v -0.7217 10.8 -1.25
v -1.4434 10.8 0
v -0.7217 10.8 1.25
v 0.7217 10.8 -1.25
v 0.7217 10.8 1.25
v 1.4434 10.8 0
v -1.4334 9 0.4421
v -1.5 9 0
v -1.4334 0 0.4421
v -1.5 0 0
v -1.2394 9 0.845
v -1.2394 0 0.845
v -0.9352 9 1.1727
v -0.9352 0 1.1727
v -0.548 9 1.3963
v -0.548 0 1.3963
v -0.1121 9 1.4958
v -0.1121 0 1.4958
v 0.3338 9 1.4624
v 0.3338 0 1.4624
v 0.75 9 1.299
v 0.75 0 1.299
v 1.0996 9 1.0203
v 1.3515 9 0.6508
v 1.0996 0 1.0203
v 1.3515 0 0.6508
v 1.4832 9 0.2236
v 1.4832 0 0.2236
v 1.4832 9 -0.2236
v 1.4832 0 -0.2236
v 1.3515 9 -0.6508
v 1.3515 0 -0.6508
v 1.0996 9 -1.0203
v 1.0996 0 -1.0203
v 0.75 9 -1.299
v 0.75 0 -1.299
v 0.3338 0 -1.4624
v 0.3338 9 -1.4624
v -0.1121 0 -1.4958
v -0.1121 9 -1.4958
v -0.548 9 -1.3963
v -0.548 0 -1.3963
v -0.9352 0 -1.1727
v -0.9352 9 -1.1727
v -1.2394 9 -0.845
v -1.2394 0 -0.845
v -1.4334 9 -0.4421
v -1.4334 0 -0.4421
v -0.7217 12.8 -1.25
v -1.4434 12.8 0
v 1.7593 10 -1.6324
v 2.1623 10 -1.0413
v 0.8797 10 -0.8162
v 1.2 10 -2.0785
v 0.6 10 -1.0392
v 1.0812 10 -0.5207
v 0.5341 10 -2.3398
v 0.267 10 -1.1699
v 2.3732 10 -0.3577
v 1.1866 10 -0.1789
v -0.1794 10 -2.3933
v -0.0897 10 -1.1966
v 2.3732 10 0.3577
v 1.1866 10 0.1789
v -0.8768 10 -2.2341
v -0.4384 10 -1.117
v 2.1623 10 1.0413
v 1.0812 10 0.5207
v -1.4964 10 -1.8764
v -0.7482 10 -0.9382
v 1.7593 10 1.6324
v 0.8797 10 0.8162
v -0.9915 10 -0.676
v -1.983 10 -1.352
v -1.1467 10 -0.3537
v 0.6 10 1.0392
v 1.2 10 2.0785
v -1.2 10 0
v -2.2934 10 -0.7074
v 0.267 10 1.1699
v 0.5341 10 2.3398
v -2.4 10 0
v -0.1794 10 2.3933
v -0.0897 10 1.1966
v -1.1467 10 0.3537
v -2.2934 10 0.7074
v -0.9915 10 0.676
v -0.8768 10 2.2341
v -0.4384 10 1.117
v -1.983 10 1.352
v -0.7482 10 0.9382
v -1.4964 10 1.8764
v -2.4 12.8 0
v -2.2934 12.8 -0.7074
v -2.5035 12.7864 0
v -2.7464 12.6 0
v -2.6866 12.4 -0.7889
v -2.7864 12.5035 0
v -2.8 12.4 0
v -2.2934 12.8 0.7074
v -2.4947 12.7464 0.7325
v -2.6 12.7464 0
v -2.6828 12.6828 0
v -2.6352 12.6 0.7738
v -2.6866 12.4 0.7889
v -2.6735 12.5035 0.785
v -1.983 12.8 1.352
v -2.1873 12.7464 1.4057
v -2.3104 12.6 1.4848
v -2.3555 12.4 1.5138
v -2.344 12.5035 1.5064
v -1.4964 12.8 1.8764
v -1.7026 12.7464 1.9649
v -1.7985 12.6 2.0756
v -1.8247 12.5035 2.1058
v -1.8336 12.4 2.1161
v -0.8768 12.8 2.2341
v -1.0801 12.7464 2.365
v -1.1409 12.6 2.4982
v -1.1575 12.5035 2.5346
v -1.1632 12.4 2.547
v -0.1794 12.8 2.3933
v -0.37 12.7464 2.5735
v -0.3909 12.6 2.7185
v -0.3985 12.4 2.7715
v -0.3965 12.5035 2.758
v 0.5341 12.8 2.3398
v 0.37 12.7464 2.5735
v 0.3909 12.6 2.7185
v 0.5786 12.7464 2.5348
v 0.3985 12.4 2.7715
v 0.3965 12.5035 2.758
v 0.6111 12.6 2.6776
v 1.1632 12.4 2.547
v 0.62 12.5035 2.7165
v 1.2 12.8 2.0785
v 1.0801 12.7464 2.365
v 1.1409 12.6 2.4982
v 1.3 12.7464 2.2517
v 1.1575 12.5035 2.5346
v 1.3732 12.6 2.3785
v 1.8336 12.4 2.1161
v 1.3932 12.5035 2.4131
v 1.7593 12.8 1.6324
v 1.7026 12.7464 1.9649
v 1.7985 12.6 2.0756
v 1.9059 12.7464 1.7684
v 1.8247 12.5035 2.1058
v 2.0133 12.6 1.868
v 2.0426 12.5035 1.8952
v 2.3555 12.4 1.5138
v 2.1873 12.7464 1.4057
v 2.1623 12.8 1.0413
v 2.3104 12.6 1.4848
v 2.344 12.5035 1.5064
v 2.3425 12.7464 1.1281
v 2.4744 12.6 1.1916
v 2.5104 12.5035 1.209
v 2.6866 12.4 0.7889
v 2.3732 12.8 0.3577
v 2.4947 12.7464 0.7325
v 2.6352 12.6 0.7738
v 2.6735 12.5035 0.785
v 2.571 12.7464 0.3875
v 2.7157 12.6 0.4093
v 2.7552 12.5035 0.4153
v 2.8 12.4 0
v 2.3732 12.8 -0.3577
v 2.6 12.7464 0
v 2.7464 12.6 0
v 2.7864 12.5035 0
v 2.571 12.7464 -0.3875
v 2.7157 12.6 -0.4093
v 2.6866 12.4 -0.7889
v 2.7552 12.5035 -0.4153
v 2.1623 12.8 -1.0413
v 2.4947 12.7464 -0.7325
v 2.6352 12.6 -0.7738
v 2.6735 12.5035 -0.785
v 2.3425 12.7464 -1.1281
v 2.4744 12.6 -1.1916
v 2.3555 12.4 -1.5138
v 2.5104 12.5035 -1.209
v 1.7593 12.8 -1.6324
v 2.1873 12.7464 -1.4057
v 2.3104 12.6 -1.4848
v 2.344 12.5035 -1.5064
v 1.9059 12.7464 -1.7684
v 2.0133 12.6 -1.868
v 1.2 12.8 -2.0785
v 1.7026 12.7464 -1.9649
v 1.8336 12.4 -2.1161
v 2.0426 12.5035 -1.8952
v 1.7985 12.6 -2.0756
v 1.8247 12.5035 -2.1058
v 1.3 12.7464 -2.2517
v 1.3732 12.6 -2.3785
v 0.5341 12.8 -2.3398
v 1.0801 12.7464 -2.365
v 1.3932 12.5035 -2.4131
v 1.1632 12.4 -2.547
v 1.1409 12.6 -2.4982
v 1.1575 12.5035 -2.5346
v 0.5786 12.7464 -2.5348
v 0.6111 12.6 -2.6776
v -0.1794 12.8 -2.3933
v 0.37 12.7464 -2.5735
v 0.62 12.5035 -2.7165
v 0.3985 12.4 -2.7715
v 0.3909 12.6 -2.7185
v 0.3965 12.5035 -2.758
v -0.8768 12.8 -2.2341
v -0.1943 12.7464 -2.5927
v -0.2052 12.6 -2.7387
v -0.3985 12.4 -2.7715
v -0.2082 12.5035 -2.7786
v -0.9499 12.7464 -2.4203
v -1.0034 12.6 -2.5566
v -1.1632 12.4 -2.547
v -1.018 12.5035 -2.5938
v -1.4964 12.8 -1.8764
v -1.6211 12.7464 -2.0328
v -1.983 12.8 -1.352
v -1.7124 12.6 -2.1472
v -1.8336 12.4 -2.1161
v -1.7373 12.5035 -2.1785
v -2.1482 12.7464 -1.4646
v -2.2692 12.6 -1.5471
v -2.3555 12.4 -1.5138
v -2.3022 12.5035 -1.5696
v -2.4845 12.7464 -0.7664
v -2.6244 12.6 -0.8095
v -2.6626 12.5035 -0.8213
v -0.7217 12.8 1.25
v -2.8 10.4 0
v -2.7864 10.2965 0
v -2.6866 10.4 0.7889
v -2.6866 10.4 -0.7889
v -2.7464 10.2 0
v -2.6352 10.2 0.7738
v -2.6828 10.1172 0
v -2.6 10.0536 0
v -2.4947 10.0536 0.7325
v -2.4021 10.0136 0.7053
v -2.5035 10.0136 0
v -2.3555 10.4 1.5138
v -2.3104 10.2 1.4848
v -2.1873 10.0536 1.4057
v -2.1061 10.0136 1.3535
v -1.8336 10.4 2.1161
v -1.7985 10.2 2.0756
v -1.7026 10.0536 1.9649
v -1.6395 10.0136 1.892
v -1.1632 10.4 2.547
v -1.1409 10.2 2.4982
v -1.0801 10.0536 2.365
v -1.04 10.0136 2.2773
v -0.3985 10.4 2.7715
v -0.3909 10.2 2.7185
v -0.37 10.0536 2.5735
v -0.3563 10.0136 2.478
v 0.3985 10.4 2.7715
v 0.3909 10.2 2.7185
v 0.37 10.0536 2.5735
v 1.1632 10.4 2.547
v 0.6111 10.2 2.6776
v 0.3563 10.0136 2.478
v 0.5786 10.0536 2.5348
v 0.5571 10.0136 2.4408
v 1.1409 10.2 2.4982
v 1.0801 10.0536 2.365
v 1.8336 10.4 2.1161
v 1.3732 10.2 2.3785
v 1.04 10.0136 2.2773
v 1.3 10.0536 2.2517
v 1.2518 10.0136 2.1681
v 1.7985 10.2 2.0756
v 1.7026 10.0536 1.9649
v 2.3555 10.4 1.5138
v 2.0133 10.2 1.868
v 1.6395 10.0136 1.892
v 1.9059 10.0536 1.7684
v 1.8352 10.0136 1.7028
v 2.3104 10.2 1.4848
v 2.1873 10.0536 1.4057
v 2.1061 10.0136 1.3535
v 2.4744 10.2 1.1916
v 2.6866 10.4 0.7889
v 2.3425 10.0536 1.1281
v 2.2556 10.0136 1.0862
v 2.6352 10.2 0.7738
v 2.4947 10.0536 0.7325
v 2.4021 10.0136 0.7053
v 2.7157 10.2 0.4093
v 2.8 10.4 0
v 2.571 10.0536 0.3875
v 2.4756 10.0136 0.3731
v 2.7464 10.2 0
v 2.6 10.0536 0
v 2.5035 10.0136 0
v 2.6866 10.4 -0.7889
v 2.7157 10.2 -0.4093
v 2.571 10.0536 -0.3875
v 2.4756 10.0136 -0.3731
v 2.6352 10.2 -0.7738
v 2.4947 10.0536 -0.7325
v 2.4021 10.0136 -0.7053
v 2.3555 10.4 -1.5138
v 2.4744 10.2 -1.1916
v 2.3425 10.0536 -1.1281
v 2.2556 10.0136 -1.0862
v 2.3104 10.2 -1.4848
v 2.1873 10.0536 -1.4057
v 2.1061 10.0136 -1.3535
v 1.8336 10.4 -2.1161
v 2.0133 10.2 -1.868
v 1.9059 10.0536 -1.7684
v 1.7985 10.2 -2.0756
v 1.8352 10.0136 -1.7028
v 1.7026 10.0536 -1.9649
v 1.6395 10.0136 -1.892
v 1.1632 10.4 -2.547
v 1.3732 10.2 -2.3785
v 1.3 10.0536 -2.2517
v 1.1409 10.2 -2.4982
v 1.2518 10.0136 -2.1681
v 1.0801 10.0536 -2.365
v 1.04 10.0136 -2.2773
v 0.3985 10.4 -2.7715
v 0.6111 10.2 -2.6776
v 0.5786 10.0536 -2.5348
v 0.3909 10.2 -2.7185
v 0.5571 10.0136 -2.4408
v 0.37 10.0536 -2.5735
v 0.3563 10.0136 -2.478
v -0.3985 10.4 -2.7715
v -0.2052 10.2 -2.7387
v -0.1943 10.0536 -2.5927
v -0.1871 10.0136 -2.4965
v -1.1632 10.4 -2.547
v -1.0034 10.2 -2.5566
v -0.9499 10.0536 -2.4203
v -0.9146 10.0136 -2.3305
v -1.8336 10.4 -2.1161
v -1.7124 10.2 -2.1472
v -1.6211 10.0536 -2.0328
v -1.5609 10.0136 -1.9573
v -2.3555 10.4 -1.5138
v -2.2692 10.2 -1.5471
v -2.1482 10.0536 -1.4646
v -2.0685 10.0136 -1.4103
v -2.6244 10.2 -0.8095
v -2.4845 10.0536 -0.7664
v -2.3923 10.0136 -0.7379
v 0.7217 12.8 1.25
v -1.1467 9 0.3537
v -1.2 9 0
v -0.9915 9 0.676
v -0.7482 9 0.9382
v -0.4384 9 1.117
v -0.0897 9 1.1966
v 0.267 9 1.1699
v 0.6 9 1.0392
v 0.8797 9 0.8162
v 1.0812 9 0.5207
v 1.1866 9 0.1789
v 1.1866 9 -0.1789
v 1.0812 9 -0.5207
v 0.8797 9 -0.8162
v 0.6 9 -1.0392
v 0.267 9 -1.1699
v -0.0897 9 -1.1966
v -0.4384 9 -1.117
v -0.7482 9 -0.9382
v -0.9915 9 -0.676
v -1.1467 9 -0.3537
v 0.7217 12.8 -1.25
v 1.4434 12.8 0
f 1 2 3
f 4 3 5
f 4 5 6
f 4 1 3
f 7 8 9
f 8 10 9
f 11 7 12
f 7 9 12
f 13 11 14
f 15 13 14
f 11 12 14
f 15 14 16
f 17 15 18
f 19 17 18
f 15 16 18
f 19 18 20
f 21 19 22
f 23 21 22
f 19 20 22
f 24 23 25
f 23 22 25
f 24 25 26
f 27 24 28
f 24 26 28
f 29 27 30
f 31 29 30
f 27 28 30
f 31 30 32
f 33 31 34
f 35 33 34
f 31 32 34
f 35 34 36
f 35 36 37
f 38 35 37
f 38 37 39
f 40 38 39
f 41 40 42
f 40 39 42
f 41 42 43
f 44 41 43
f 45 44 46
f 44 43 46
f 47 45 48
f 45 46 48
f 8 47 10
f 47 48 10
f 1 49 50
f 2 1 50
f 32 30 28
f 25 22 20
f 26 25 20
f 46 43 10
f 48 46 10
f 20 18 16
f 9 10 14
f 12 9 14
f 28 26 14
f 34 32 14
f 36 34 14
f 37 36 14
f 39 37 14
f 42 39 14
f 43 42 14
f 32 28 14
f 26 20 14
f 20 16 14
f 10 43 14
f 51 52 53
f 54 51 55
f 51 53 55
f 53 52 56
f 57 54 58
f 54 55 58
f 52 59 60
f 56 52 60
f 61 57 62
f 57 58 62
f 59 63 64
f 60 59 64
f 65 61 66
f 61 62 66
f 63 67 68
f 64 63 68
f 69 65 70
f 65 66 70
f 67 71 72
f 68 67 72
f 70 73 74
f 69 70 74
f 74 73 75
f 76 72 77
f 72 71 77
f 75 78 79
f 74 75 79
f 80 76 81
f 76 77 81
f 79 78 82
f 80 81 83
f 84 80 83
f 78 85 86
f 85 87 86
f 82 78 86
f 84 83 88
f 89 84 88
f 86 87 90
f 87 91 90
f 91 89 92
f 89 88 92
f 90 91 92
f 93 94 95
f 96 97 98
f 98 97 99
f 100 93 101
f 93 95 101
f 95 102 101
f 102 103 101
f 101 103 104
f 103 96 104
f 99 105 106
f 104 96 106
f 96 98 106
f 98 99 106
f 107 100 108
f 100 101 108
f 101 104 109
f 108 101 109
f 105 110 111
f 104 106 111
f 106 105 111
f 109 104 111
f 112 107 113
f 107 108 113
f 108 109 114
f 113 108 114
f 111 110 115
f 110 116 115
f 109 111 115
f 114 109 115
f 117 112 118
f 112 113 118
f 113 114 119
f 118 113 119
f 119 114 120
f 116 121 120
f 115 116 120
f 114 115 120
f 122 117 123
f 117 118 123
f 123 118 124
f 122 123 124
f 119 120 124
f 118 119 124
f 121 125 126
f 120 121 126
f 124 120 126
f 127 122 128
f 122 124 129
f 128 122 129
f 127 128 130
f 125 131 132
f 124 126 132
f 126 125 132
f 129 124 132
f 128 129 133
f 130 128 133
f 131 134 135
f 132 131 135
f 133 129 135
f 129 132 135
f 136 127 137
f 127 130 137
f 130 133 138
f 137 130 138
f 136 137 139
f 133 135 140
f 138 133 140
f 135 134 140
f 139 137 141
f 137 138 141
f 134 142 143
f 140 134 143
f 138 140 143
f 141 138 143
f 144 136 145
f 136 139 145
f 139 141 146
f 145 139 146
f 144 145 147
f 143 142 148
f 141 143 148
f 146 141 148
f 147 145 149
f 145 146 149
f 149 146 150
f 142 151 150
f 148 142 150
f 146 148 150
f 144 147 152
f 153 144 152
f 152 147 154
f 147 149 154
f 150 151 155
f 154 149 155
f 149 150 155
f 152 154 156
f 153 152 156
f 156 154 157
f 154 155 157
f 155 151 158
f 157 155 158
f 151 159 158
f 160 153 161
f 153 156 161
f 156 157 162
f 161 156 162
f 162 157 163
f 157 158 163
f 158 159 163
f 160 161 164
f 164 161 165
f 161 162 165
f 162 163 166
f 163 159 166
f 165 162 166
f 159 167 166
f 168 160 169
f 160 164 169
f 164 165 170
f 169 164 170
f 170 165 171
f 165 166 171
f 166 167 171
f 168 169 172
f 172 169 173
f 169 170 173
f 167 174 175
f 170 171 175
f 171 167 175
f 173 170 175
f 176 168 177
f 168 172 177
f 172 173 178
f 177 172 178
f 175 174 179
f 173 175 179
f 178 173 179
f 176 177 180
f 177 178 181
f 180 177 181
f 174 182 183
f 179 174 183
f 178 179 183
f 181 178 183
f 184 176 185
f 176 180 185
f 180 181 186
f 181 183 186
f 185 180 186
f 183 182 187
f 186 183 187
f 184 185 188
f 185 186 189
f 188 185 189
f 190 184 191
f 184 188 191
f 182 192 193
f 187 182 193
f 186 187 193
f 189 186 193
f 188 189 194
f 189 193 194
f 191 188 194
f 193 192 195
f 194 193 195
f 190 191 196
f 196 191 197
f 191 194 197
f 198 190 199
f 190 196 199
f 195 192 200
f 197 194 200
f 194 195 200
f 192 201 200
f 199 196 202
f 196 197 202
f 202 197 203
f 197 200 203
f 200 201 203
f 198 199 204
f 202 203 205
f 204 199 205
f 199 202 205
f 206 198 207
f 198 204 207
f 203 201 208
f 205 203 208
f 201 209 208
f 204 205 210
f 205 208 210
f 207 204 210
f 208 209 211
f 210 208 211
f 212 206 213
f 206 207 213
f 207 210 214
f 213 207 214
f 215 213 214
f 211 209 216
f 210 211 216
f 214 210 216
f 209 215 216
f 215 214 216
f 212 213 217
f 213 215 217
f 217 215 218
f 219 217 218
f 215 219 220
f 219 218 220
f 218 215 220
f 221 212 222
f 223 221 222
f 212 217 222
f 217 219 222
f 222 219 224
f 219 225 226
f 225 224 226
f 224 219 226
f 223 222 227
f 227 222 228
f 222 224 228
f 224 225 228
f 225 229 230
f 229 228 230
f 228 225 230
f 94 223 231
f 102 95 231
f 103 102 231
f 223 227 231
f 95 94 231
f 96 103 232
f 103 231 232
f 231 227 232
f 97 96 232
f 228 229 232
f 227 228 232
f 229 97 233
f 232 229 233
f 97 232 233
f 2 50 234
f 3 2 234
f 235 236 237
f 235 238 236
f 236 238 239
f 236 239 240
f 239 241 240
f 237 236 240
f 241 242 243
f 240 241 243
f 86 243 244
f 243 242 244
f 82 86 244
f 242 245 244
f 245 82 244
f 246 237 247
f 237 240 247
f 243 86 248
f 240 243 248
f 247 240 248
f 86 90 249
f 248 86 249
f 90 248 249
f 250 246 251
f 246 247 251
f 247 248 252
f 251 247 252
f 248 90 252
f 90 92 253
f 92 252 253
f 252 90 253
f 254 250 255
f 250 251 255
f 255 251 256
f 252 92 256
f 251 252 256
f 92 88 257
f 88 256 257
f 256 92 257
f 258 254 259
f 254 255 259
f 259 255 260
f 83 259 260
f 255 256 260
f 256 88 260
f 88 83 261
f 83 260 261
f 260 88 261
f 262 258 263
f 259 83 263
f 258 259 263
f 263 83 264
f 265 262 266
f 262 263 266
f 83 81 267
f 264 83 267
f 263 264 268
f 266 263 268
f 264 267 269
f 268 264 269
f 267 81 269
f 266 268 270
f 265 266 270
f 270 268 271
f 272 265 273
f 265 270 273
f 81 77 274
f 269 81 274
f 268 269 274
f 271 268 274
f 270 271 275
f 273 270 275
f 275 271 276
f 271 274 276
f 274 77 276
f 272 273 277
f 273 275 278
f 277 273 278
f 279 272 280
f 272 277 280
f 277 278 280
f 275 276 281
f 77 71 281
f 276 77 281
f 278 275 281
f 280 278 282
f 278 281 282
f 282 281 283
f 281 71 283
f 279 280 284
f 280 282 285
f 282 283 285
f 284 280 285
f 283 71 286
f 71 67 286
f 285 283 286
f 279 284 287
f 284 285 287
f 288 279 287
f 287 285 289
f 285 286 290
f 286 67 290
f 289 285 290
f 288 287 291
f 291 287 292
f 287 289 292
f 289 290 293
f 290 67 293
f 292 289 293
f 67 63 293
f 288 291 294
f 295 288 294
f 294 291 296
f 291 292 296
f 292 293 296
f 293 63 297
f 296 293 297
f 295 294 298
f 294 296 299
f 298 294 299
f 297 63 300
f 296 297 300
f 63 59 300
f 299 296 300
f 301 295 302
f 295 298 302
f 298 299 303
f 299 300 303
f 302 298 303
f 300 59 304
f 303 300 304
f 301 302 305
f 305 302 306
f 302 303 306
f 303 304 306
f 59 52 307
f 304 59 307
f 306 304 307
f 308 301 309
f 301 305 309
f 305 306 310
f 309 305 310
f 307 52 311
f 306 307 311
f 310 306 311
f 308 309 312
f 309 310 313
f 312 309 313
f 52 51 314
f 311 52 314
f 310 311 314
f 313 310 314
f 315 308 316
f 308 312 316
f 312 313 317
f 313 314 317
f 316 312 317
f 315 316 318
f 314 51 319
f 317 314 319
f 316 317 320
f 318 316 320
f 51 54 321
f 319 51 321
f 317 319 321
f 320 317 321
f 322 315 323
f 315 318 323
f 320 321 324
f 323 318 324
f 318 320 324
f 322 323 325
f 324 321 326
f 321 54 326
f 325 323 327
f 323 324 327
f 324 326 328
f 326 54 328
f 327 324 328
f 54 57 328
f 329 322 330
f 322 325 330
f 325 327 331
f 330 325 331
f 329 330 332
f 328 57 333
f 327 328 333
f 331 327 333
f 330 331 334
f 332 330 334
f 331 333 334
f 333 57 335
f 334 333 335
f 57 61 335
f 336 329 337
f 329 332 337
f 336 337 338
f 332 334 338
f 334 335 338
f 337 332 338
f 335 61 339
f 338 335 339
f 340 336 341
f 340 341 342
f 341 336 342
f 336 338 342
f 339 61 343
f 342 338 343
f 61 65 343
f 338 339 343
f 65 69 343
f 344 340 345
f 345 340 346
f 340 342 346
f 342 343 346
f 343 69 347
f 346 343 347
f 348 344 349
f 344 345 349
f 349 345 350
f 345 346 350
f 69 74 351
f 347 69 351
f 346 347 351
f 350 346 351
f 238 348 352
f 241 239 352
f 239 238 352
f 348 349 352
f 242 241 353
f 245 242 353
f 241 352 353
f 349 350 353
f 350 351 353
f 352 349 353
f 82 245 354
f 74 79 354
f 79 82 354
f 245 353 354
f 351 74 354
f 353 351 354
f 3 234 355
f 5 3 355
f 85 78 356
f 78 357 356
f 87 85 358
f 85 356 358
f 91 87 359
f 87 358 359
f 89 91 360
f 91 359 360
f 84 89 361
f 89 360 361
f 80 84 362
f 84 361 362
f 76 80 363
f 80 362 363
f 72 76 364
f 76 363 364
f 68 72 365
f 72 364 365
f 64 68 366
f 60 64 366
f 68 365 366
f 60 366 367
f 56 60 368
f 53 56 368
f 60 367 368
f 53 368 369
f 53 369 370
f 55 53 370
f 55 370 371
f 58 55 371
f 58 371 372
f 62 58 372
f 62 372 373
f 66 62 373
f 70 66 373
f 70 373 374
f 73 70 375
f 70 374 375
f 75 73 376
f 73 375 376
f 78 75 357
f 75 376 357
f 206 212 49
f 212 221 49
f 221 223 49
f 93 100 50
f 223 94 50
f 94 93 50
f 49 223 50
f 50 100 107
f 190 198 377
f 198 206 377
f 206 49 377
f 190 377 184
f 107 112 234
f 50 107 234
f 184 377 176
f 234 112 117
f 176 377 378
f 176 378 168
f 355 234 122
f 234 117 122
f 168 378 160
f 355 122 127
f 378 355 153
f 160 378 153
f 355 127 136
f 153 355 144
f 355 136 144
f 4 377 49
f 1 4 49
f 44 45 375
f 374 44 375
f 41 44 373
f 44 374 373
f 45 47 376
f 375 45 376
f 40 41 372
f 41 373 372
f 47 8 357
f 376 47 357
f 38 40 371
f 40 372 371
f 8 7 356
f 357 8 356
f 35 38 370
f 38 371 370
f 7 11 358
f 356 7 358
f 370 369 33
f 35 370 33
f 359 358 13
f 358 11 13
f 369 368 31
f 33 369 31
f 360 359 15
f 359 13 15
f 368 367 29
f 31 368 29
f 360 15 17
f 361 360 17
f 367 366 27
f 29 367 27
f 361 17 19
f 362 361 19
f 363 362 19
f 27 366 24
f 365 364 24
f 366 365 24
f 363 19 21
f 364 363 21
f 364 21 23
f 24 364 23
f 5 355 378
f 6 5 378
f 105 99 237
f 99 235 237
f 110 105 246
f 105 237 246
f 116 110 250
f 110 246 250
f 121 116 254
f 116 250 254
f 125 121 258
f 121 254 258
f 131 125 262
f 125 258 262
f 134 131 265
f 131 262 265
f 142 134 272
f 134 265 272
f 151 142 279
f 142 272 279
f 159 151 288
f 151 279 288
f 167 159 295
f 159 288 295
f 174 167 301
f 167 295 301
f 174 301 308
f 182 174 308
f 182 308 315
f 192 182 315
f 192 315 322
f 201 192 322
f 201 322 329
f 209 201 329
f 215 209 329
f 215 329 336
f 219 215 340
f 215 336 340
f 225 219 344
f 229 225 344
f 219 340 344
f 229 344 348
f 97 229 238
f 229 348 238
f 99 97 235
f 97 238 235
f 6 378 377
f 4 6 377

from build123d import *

# Parameters (mm, degrees)
CUT_EXTRUDE_1_DEPTH = 2


with BuildPart() as part:
    # 草图1 → 旋转1 (revolve)
    with BuildSketch(Plane.XY):
        with BuildLine():
            Line((0, 12.8), (-2.4, 12.8))
            ThreePointArc((-2.4, 12.8), (-2.682842712, 12.682842712), (-2.8, 12.4))
            Line((-2.8, 12.4), (-2.8, 10.4))
            ThreePointArc((-2.8, 10.4), (-2.682842712, 10.117157288), (-2.4, 10))
            Line((-2.4, 10), (-1.2, 10))
            Line((-1.2, 10), (-1.2, 9))
            Line((-1.2, 9), (-1.5, 9))
            Line((-1.5, 9), (-1.5, 0))
            Line((-1.5, 0), (0, 0))
            Line((0, 0), (0, 12.8))
        make_face()
    revolve(axis=Axis((0, 0, 0), (0, 1, 0)))

    # 草图2 → 切除-拉伸1 (cut)
    with BuildSketch(Plane(origin=(0, 12.8, 0), x_dir=(1, 0, 0), z_dir=(0, 1, 0))):
        Polygon((-0.721687836, 1.25), (-1.443375673, 0), (-0.721687836, -1.25), (0.721687836, -1.25), (1.443375673, 0), (0.721687836, 1.25), align=None)
    extrude(amount=-CUT_EXTRUDE_1_DEPTH, mode=Mode.SUBTRACT)


solid = part.part
